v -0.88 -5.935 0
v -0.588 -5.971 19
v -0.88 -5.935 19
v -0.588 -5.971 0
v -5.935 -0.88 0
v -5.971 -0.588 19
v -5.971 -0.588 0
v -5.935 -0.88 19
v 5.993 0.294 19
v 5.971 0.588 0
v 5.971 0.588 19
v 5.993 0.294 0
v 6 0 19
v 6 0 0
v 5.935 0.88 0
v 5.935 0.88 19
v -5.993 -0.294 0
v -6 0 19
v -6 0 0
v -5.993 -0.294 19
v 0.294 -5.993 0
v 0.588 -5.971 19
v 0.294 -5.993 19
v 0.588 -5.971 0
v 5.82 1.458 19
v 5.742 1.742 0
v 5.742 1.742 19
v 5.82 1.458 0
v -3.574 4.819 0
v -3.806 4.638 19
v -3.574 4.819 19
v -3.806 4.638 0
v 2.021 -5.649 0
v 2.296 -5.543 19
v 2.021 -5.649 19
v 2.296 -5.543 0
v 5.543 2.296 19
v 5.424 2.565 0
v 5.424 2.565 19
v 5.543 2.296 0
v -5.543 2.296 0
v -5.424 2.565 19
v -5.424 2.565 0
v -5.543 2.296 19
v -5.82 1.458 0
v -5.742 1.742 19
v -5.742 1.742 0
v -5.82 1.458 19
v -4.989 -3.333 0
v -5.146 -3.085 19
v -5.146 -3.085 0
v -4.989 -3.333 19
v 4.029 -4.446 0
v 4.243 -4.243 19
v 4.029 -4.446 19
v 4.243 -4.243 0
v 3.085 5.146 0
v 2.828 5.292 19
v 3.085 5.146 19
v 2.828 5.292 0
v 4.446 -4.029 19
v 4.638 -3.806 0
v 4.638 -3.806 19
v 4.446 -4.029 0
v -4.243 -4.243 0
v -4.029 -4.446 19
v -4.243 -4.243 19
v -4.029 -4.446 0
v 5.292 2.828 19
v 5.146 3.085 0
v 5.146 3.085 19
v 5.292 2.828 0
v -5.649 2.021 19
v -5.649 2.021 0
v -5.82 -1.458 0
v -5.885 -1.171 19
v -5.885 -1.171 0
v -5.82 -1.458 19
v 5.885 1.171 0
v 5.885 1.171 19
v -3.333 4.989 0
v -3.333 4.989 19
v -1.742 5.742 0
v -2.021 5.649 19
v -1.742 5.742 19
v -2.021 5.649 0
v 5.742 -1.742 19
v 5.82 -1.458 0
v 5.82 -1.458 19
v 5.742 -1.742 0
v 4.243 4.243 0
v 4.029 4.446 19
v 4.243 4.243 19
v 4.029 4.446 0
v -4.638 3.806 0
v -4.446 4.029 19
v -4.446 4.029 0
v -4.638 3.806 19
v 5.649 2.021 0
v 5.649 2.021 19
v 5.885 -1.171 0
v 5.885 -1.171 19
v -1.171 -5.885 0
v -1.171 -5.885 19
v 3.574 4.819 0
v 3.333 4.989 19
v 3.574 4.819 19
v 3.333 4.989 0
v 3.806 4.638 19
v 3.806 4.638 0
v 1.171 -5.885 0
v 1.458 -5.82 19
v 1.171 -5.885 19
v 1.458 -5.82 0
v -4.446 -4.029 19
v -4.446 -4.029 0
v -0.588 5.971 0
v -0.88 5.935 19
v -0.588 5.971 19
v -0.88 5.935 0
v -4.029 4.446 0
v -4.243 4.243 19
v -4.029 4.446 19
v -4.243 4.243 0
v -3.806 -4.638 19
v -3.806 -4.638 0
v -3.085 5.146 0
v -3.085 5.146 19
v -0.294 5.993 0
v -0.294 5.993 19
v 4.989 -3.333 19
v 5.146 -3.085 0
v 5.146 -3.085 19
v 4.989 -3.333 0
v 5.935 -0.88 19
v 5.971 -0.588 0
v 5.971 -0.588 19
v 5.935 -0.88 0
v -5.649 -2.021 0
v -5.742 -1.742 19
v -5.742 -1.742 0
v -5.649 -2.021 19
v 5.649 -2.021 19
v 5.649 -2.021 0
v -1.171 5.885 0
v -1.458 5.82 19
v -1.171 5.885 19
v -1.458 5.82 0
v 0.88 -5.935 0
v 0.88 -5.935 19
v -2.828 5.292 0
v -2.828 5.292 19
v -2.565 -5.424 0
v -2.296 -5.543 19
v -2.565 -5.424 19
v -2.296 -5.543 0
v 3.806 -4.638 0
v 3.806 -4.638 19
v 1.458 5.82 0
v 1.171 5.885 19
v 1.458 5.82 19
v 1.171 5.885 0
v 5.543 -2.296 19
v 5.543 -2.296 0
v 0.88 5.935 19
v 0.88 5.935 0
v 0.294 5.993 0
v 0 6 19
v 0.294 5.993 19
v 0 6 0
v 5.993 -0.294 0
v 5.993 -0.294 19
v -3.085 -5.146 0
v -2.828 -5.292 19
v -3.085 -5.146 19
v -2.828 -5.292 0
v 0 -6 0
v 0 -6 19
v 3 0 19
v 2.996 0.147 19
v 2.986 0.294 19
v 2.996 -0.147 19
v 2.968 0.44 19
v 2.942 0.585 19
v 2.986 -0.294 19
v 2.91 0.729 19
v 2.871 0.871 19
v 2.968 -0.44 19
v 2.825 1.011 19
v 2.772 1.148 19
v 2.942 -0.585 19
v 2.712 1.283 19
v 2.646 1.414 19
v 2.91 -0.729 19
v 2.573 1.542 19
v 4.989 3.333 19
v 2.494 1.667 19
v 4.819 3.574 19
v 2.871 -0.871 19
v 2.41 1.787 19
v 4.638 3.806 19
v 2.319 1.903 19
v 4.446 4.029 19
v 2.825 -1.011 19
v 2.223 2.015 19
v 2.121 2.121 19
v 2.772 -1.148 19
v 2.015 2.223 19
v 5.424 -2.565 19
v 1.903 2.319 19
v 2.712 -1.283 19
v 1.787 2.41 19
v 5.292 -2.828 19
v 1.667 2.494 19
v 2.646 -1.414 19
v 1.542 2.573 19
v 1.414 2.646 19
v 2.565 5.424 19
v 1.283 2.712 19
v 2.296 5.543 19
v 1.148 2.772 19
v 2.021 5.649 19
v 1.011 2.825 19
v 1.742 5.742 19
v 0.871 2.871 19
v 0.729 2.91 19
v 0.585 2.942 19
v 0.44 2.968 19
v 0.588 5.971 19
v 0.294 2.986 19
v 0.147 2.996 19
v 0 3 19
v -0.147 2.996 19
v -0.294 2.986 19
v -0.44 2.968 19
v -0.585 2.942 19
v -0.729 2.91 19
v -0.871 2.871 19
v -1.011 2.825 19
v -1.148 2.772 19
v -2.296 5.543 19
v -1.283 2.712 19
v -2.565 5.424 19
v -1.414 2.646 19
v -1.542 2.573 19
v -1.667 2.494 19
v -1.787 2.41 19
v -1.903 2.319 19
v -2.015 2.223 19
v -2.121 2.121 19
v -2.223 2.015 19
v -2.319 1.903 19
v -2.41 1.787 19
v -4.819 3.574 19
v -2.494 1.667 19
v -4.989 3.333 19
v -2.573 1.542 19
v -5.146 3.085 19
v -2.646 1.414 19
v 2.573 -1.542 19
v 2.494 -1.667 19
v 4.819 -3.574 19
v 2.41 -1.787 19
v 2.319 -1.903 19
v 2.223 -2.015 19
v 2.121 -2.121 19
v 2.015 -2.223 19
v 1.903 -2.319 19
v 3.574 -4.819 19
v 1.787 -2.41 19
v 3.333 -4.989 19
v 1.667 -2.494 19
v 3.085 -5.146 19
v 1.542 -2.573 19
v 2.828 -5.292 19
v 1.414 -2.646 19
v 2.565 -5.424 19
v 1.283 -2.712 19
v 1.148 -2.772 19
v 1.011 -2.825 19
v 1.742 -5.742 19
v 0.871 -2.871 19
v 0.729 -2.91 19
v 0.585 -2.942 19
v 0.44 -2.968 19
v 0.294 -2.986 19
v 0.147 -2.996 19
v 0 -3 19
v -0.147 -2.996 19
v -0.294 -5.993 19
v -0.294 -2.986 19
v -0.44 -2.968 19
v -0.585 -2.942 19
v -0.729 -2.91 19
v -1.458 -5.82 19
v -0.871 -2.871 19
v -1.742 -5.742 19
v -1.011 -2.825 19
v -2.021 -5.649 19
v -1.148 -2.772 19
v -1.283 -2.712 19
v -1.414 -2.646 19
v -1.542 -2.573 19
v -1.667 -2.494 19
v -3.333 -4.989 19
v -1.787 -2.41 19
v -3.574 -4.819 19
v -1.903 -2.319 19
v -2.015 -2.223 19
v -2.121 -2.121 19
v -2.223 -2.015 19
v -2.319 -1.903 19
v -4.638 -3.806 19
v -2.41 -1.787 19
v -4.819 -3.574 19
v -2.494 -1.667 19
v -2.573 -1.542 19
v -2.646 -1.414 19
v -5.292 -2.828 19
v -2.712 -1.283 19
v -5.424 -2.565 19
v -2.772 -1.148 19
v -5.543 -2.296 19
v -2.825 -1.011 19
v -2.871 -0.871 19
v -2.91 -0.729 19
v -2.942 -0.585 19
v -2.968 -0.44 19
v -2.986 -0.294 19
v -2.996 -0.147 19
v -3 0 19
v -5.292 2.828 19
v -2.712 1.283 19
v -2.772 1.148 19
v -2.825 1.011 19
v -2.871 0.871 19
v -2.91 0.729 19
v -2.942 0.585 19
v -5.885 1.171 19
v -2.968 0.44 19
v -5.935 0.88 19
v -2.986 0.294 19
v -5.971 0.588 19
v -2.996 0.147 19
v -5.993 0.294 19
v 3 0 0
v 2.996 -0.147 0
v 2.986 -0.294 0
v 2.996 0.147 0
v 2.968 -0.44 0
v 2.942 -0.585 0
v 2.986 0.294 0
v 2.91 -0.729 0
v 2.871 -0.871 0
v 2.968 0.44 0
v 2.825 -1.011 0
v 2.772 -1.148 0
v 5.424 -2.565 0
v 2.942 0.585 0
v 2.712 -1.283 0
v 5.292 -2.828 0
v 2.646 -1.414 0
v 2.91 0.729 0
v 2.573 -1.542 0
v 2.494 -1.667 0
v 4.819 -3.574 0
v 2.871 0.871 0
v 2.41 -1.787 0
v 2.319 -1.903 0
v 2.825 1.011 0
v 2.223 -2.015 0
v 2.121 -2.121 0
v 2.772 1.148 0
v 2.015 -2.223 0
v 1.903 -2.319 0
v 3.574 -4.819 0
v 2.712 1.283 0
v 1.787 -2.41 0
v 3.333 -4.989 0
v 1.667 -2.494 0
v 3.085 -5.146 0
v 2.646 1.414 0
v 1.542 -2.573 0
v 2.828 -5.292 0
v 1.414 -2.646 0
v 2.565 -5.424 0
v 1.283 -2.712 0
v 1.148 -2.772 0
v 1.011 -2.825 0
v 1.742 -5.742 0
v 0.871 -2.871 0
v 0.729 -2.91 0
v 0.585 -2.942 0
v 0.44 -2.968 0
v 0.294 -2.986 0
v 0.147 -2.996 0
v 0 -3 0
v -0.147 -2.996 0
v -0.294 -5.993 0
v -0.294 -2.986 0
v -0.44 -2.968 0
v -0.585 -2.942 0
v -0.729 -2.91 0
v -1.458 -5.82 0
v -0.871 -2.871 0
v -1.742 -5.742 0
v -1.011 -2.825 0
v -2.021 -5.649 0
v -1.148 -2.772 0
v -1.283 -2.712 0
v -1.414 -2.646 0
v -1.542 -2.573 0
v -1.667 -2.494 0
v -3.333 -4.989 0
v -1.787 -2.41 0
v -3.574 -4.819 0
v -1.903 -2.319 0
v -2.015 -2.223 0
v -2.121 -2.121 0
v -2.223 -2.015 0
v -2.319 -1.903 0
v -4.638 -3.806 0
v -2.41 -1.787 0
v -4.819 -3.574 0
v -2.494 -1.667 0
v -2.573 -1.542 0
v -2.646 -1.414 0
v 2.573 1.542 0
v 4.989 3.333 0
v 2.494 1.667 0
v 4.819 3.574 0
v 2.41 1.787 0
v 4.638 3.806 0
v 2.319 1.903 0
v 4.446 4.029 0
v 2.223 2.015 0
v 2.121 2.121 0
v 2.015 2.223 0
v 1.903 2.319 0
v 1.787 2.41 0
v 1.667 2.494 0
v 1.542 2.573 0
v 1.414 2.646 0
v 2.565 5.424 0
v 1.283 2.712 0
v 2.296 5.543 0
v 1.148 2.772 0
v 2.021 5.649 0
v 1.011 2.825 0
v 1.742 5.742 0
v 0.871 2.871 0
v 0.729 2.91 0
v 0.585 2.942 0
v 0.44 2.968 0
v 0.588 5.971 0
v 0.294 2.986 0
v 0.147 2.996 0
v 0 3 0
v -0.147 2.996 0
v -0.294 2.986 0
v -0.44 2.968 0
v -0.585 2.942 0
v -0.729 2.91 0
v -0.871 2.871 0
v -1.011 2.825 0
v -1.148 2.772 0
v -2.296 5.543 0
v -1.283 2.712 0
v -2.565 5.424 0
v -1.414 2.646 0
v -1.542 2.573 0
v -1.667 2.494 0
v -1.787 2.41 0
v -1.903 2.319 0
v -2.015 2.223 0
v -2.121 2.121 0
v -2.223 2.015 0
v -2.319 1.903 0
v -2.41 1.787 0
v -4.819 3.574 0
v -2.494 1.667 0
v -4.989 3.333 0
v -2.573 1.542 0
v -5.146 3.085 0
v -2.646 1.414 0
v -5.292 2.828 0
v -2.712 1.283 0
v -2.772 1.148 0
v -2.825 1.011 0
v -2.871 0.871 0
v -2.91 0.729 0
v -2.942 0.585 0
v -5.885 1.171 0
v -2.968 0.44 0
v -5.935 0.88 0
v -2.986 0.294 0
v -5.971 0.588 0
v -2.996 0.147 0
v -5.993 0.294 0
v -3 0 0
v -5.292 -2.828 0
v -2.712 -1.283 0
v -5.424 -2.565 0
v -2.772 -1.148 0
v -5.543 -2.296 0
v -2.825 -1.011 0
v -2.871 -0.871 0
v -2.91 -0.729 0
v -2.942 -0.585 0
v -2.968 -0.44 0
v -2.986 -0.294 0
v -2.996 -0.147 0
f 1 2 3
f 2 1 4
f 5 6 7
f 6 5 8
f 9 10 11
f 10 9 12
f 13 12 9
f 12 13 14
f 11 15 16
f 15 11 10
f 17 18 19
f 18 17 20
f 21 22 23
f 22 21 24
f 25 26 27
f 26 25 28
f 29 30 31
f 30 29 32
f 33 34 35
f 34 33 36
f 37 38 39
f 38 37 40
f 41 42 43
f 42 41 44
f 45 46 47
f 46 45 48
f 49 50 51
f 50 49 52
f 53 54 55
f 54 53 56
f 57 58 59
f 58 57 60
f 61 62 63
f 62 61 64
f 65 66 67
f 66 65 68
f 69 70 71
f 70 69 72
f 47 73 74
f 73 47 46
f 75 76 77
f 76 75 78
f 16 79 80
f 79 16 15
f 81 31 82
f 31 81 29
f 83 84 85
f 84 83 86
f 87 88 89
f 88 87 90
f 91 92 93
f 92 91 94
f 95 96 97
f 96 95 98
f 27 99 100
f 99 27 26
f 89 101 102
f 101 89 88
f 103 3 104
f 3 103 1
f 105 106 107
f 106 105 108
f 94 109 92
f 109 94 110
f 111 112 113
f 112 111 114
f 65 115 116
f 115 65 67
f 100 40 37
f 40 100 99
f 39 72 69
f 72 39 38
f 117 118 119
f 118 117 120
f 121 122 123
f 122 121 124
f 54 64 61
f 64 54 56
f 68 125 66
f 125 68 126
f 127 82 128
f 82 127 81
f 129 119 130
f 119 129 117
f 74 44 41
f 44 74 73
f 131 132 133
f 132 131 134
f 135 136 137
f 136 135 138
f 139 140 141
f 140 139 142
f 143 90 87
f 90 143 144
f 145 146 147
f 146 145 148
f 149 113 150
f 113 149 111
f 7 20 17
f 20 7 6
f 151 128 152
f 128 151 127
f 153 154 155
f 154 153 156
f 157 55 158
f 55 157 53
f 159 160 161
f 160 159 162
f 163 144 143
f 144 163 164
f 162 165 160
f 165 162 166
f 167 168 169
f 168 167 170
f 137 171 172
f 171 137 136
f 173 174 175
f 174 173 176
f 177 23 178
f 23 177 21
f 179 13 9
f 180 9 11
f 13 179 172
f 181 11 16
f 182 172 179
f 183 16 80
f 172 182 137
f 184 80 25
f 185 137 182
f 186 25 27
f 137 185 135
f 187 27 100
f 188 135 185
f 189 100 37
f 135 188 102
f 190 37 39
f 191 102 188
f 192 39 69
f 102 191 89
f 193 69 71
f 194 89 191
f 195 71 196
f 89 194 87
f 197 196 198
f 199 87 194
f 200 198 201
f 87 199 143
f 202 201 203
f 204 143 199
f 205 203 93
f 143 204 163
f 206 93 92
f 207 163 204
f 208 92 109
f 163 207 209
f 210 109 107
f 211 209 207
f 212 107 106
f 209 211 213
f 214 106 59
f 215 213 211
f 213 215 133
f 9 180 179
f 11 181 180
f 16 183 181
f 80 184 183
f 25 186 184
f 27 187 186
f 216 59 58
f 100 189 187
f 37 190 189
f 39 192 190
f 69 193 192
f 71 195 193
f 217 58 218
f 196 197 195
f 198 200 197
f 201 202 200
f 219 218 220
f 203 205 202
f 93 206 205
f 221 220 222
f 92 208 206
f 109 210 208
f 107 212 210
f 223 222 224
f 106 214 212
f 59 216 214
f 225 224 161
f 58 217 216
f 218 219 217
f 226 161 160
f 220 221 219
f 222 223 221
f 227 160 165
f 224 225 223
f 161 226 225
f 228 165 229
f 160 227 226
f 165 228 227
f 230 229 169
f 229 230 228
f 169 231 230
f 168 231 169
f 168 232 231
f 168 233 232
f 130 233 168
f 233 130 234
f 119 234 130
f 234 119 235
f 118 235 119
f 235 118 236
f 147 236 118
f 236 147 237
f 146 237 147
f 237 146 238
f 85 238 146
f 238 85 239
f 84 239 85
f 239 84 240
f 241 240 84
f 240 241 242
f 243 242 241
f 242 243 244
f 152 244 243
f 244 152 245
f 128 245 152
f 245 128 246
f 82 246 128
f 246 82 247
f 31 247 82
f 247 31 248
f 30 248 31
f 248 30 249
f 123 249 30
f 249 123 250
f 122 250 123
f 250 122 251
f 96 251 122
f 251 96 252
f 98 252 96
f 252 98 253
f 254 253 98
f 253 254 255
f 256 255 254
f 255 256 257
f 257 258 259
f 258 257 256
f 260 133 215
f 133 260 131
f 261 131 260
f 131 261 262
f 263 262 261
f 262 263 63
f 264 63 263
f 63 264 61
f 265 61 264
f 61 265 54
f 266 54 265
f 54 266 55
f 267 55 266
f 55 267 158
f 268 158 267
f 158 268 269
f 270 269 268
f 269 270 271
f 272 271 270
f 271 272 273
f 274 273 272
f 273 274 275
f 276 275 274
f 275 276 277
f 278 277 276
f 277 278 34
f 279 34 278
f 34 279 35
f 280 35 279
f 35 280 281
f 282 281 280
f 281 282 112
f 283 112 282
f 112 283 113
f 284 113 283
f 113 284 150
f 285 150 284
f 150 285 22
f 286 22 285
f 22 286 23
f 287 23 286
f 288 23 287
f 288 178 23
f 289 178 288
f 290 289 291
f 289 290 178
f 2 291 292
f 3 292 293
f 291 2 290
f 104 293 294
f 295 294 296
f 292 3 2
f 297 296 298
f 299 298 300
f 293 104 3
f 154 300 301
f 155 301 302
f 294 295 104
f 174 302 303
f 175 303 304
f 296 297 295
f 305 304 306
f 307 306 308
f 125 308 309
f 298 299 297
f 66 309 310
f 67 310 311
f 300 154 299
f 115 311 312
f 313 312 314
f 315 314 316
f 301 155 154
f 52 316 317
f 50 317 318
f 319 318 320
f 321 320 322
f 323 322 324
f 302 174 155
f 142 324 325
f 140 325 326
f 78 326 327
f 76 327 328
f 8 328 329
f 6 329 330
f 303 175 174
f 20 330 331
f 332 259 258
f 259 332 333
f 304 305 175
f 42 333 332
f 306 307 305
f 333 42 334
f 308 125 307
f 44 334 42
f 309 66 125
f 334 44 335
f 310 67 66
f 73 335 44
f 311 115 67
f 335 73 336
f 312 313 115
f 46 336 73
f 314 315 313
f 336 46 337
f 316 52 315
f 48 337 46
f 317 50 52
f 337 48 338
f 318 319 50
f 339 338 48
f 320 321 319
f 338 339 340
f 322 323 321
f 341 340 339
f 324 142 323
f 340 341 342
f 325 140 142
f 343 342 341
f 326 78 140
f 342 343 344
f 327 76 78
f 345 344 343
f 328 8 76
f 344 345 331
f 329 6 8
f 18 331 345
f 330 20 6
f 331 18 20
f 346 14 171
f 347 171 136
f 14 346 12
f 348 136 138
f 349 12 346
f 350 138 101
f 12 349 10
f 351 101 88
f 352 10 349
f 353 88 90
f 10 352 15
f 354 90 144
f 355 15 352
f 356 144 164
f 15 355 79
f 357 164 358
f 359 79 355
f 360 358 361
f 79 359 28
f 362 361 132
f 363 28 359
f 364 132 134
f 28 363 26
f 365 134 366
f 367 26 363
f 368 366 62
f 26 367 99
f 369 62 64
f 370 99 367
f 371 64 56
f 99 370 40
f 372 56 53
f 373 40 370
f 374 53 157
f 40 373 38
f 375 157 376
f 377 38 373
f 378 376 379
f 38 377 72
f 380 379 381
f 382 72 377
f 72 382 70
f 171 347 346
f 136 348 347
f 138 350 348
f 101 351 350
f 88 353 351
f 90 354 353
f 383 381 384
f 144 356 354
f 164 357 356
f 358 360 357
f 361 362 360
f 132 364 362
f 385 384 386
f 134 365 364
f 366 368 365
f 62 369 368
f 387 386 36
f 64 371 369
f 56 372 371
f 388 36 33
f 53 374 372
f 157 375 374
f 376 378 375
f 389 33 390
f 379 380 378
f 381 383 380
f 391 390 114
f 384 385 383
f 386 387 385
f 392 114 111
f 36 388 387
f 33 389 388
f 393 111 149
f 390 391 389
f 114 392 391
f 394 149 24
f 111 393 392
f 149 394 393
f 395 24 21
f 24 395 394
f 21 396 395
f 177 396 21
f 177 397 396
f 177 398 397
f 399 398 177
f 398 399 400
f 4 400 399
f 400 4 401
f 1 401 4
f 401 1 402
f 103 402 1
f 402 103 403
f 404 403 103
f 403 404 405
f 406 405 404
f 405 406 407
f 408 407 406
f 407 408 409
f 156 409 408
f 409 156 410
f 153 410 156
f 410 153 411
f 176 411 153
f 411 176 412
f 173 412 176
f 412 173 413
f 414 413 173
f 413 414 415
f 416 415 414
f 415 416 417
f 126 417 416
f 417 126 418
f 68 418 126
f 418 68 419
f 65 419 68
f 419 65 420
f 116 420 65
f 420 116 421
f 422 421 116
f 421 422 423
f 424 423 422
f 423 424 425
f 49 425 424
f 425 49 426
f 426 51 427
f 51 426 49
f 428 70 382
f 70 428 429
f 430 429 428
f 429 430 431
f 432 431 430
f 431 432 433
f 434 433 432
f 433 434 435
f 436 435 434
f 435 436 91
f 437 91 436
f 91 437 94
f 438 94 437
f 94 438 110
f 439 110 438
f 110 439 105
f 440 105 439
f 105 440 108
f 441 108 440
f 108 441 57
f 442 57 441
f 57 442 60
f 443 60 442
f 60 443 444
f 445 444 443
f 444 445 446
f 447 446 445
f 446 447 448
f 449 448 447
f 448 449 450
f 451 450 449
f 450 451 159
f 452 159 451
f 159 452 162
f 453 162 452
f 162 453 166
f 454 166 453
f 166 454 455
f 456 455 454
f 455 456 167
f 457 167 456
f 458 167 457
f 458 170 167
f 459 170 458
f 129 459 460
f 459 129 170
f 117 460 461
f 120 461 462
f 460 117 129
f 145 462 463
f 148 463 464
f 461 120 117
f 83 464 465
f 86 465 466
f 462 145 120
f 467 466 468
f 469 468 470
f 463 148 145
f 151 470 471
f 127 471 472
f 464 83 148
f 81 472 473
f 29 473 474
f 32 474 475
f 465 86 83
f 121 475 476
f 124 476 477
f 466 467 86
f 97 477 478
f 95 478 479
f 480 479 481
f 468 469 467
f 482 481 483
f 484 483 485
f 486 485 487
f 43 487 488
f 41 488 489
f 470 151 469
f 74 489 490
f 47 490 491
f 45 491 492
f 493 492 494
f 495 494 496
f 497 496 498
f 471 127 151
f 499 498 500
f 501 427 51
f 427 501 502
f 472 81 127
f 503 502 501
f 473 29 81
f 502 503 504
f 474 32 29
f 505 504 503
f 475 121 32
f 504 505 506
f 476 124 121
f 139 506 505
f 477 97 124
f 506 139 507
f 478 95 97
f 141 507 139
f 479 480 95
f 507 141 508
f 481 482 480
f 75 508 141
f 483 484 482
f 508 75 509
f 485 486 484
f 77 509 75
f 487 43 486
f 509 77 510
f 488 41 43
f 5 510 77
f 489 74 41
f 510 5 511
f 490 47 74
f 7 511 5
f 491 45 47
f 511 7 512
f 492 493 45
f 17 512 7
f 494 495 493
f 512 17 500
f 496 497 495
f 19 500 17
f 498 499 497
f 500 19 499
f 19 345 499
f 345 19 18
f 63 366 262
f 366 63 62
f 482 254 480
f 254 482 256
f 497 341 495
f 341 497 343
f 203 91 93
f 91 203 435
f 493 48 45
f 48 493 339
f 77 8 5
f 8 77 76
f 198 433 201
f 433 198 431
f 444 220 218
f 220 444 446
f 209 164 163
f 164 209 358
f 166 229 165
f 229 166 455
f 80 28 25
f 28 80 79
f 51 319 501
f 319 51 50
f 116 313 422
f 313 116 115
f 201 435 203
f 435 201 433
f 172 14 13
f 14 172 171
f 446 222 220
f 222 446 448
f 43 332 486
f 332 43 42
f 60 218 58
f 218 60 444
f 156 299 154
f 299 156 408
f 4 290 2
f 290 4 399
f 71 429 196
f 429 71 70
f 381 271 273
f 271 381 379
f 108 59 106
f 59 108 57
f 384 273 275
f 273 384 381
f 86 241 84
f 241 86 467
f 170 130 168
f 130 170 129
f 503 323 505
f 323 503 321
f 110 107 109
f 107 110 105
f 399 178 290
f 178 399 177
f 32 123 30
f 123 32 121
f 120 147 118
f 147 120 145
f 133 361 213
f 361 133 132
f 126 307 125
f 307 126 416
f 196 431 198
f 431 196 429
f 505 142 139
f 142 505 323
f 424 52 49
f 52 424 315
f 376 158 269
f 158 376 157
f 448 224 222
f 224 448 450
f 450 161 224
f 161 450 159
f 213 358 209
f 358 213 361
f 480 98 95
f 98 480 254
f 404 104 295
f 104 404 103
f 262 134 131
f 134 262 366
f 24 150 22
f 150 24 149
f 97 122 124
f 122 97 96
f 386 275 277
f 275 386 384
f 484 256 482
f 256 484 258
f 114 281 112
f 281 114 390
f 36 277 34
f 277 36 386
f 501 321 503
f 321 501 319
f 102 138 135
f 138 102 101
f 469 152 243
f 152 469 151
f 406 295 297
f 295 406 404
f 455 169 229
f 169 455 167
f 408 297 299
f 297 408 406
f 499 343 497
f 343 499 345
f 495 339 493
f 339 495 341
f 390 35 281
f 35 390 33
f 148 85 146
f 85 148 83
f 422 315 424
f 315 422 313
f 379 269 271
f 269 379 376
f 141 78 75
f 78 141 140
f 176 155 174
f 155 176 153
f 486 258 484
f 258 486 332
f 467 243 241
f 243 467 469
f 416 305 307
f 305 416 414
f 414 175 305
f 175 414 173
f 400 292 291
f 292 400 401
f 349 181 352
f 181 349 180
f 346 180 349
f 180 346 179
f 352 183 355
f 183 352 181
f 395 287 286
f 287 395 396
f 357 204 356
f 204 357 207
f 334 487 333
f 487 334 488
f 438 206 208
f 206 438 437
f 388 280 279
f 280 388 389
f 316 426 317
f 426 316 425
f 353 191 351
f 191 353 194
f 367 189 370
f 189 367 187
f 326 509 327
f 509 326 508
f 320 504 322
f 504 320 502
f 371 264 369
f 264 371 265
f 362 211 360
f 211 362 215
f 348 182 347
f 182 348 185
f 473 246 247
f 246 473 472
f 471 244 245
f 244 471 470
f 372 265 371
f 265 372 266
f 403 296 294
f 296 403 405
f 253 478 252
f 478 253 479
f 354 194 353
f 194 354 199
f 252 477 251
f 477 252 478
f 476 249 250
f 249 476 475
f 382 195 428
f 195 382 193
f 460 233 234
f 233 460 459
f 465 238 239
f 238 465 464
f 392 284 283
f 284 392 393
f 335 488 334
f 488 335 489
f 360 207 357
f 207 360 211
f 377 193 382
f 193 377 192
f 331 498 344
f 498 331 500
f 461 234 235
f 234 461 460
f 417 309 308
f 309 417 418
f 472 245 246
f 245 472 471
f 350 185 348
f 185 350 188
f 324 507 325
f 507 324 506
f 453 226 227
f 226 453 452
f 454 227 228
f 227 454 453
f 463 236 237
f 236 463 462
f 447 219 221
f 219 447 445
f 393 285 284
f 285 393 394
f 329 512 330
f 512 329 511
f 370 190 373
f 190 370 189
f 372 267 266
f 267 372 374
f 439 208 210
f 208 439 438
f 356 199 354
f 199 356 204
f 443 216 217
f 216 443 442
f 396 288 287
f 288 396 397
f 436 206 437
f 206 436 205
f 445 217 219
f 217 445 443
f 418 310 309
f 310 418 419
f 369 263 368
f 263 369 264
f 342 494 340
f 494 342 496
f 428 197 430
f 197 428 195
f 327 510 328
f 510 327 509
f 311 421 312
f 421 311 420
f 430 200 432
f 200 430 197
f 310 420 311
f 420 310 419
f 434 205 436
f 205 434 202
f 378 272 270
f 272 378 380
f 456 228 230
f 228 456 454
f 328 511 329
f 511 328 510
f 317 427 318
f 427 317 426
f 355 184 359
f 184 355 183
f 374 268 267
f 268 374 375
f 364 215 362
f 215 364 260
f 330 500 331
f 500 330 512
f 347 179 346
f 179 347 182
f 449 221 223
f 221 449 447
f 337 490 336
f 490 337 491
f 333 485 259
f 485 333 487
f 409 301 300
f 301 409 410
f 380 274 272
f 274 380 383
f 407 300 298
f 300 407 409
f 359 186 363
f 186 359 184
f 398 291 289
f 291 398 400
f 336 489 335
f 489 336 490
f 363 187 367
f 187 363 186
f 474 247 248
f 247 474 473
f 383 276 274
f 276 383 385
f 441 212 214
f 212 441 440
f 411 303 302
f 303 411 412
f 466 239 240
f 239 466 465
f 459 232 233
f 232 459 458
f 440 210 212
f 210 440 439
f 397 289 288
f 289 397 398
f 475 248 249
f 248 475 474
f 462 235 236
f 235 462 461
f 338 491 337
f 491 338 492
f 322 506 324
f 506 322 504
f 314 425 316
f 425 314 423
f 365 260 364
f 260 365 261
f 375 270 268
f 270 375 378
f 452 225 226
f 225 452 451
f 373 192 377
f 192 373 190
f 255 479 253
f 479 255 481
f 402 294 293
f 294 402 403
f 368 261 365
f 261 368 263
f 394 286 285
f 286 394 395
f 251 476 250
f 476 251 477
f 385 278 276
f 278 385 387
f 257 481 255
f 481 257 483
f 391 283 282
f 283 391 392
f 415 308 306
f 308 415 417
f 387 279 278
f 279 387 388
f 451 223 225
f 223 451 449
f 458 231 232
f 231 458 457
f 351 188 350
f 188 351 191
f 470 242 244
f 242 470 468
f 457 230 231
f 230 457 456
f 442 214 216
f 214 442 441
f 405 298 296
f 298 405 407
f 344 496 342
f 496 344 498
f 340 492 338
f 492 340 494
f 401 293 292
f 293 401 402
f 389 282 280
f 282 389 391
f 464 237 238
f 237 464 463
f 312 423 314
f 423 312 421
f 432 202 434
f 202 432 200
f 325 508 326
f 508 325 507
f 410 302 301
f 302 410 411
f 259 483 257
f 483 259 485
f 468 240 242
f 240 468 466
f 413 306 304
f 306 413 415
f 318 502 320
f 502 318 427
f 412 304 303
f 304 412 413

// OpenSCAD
$fn = 128;

bore_d = 6.0;
od_d   = 12.0;
len    = 19.0;

difference() {
  cylinder(d=od_d, h=len, center=false);
  translate([0,0,-0.1]) cylinder(d=bore_d, h=len+0.2, center=false);
}
